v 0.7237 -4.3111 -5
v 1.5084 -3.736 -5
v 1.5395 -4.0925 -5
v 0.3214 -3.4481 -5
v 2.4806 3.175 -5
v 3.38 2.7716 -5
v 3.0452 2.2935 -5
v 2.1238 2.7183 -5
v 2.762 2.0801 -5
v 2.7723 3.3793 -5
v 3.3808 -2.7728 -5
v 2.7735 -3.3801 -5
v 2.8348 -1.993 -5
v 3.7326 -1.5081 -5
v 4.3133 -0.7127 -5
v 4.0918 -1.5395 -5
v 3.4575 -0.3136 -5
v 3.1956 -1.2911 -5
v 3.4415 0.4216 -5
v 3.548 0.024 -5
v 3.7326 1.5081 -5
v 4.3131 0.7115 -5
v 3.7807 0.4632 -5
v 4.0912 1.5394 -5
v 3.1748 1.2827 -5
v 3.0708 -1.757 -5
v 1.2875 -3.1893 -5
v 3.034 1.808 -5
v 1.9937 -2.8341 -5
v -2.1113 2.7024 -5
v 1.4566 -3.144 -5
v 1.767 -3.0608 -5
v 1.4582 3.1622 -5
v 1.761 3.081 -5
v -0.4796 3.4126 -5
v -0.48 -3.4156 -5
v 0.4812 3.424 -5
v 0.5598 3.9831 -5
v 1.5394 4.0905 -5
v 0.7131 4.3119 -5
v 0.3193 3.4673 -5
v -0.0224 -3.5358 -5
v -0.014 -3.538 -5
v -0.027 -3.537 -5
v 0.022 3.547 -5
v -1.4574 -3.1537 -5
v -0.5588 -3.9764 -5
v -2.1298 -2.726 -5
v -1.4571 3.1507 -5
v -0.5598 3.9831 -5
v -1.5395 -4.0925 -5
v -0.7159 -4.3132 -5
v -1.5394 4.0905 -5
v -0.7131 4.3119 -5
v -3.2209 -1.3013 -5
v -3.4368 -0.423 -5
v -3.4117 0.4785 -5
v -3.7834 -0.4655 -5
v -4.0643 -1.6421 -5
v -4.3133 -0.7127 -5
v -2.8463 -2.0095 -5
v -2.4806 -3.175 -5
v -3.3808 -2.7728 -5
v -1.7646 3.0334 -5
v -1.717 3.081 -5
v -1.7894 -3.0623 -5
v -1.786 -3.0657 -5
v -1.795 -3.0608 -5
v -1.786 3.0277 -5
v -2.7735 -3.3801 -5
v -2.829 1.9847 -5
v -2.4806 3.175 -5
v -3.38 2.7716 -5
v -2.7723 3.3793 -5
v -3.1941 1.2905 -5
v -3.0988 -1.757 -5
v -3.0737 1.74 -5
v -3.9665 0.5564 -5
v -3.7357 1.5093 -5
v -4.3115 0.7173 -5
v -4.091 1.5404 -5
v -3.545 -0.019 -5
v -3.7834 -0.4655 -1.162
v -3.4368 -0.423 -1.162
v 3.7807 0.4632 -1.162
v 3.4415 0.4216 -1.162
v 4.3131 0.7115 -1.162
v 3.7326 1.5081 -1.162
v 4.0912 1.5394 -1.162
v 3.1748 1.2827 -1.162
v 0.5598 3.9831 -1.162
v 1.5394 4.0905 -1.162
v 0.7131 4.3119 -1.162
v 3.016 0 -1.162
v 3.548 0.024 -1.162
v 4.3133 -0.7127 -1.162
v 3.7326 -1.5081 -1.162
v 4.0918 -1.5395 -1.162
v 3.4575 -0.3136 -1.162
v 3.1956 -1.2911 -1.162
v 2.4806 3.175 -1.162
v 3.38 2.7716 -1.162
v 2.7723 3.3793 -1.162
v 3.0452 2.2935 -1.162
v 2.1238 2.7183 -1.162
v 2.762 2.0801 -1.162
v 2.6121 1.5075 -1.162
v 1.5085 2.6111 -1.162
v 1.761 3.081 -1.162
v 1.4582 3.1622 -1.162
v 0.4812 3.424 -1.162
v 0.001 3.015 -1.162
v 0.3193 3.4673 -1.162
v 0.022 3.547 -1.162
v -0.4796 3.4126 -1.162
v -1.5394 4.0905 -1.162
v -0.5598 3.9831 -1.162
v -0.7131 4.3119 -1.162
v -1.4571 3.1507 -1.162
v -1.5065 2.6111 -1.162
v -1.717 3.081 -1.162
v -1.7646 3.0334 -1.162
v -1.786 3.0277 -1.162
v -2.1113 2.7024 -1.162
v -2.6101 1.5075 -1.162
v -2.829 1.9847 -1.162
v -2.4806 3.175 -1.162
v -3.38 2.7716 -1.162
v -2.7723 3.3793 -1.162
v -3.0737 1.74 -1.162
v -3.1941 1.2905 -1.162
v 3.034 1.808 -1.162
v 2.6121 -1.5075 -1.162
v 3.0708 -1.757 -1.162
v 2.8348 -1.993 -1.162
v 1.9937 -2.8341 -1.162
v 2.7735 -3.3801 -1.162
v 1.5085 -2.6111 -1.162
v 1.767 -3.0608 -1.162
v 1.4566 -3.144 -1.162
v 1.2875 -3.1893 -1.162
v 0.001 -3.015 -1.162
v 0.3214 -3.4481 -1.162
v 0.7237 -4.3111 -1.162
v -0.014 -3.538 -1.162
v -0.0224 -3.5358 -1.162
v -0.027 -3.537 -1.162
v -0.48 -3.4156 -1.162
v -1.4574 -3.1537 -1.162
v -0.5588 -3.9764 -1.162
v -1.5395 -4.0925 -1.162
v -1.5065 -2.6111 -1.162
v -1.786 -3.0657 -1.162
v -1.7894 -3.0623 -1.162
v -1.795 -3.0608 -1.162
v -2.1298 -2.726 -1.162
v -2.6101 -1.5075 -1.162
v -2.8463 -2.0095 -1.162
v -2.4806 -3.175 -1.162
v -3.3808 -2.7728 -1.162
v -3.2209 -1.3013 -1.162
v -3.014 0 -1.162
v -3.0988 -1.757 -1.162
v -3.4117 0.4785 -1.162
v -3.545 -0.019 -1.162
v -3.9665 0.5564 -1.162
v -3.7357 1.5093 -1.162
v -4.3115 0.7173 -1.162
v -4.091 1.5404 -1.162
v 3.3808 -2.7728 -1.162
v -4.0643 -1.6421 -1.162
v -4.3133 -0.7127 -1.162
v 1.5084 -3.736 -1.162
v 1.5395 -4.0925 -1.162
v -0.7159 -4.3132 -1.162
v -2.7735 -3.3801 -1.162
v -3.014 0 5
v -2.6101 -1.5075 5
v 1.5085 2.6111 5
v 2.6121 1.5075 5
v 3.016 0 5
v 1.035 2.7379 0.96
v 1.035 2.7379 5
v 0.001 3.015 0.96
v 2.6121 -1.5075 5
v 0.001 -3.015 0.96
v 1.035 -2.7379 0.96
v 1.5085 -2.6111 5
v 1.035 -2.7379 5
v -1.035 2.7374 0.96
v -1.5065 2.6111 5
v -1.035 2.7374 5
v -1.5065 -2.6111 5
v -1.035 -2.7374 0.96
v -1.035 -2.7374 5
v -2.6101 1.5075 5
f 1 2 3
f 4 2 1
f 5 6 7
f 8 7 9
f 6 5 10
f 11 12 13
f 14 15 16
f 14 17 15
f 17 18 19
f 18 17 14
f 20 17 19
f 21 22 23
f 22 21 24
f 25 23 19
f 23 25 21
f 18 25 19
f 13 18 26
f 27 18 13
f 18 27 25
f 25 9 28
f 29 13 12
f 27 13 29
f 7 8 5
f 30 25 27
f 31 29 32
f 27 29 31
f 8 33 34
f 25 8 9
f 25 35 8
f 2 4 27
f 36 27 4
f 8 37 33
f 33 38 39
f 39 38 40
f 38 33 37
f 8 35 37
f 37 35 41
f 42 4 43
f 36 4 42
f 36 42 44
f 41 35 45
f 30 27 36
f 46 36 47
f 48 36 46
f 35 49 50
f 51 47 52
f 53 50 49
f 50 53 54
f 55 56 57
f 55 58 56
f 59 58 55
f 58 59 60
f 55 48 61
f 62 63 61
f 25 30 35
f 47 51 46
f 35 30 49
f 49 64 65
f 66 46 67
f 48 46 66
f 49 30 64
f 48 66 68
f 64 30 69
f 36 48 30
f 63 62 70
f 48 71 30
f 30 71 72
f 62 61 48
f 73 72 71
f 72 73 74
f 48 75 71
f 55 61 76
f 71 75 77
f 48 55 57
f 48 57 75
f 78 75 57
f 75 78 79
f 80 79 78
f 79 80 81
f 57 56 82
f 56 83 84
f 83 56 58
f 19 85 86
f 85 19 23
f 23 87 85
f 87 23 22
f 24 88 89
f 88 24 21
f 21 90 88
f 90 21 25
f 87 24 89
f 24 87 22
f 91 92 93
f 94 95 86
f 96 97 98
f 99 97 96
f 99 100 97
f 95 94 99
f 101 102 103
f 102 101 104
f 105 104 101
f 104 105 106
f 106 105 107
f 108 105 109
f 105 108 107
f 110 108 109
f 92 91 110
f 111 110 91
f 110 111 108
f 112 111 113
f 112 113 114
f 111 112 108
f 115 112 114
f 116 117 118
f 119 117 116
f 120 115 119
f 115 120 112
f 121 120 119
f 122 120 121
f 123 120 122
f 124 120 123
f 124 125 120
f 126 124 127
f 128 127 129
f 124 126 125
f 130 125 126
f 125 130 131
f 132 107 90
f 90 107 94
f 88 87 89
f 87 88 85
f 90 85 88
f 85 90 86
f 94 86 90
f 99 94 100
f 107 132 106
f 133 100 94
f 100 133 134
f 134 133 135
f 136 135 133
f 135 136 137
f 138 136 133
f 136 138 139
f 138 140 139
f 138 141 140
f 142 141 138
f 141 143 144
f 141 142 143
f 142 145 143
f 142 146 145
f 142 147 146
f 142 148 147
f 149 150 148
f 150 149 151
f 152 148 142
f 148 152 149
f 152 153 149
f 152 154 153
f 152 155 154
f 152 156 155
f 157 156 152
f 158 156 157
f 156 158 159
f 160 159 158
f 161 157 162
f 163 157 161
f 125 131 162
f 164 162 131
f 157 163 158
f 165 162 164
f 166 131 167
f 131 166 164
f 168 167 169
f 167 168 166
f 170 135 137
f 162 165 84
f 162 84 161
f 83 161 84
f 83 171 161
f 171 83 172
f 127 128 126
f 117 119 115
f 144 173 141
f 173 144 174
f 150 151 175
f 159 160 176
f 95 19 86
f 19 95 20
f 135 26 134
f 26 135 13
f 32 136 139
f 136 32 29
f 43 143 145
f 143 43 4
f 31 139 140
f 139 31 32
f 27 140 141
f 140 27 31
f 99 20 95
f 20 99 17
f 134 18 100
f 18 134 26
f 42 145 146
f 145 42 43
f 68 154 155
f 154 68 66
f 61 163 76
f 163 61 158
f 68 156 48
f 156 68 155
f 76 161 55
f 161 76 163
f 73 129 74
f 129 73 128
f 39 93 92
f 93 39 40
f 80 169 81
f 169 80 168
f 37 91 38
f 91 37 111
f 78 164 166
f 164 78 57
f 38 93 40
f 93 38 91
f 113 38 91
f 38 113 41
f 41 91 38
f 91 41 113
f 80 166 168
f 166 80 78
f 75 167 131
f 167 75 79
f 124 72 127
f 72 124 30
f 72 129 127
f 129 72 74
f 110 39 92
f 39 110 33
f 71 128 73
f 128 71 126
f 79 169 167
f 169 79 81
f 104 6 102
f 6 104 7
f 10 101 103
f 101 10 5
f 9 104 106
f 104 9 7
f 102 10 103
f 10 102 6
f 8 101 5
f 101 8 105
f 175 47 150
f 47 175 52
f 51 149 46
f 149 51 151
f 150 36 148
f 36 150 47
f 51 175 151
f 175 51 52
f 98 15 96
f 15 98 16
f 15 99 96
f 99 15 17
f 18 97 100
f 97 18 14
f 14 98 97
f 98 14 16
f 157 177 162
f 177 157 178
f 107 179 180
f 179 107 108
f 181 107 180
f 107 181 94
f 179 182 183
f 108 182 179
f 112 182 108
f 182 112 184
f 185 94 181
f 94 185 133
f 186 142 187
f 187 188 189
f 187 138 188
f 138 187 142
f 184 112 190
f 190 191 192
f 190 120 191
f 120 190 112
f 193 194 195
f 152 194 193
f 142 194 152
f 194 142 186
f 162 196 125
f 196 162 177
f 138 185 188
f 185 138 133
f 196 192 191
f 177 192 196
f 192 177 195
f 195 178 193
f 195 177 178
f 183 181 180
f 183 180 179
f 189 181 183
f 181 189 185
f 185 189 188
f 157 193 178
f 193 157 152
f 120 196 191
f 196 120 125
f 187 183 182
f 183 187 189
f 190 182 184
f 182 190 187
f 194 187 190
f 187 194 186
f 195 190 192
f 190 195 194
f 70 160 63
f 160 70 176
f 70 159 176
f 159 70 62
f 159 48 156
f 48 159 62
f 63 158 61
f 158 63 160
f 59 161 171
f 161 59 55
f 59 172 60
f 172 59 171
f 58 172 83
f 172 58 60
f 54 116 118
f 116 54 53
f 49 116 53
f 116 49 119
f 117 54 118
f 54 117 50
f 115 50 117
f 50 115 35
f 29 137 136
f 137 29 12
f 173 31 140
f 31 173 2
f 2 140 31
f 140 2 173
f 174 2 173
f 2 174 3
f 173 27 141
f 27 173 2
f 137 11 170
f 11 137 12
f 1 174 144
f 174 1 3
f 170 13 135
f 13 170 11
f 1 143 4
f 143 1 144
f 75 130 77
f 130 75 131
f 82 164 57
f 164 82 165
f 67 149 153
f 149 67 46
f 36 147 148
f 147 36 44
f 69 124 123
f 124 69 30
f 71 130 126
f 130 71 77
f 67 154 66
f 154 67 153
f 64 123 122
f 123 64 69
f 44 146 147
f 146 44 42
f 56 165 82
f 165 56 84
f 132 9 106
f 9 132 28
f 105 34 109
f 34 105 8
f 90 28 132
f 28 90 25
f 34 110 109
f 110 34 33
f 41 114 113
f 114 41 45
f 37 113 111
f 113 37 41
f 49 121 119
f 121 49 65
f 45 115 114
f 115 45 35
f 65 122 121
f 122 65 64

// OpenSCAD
intersection() {
translate([-5.326, -5.326, -6]) cube(size = [10.652, 10.652, 12], center = false);
union() {
intersection() {
union() {
difference() {
translate([0, 0, 0]) sphere(r = 54.3, $fn = 12);
rotate([-180, 0, 7])
translate([-18.1, -18.1, -18.1]) cube(size = [36.2, 18.101, 23.1], center = false);
}
intersection() {
rotate([-180, 0, 25])
translate([-18.1, -18.1, -18.1]) cube(size = [36.2, 19.278, 23.1], center = false);
rotate([-180, 0, 5])
translate([-18.1, -1.177, -18.1]) cube(size = [36.2, 19.278, 36.2], center = false);
}
}
union() {
intersection() {
rotate([-180, 0, 22])
translate([-18.1, 0, -18.1]) cube(size = [36.2, 18.1, 36.2], center = false);
translate([0, -0.001, -5])
cylinder(h = 3.838, r1 = 4.504, r2 = 4.504, center = false, $fn = 12);
}
rotate([-180, 0, 7])
translate([-18.1, 0.001, 1.162]) cube(size = [36.2, 18.099, 3.838], center = false);
}
union() {
difference() {
translate([0, -0.001, -18.1])
cylinder(h = 13.1, r1 = 4.504, r2 = 4.504, center = false, $fn = 12);
translate([0, 0, 0]) sphere(r = 54.3, $fn = 12);
}
intersection() {
translate([-0.014, 0.024, -5])
cylinder(h = 3.838, r1 = 3.562, r2 = 3.562, center = false, $fn = 12);
translate([0, -0.001, -18.1])
cylinder(h = 36.2, r1 = 4.504, r2 = 4.504, center = false, $fn = 12);
}
difference() {
translate([0, -0.001, -18.1])
cylinder(h = 16.938, r1 = 4.504, r2 = 4.504, center = false, $fn = 12);
rotate([-180, 0, 7])
translate([-18.1, 0.001, -18.1]) cube(size = [36.2, 18.099, 36.2], center = false);
}
}
}
intersection() {
difference() {
difference() {
translate([0, -0.001, -5])
cylinder(h = 3.838, r1 = 4.504, r2 = 4.504, center = false, $fn = 12);
translate([5.775, 1.548, -18.1])
cylinder(h = 16.938, r1 = 4.744, r2 = 4.744, center = false, $fn = 12);
}
difference() {
rotate([0, 0, -8])
translate([-18.1, -0.001, -5]) cube(size = [18.1, 18.101, 3.838], center = false);
rotate([0, 0, -25])
translate([-18.1, -1.172, -5]) cube(size = [16.924, 19.272, 3.838], center = false);
}
}
difference() {
union() {
difference() {
translate([-9.487, -0.001, -5])
cylinder(h = 3.838, r1 = 8.765, r2 = 8.765, center = false, $fn = 12);
translate([-8.309, -4.804, -5])
cylinder(h = 3.838, r1 = 8.869, r2 = 8.869, center = false, $fn = 12);
}
rotate([0, 0, -22])
translate([-18.1, -18.1, -18.1]) cube(size = [36.2, 18.1, 16.938], center = false);
rotate([0, 0, -25])
translate([-1.176, -1.172, -18.1]) cube(size = [19.276, 19.272, 16.938], center = false);
}
union() {
intersection() {
rotate([-180, 0, 38])
translate([0, -18.1, -18.1]) cube(size = [18.1, 36.2, 23.1], center = false);
translate([-9.487, -0.001, -5])
cylinder(h = 23.1, r1 = 8.765, r2 = 8.765, center = false, $fn = 12);
}
intersection() {
rotate([0, 0, -35])
translate([-18.1, 1.178, -5]) cube(size = [36.2, 16.922, 23.1], center = false);
rotate([-180, 0, 5])
translate([-18.1, -18.1, 1.162]) cube(size = [16.923, 36.2, 3.838], center = false);
}
}
}
union() {
intersection() {
rotate([0, 0, -5])
translate([-18.1, -18.1, -18.1]) cube(size = [19.277, 36.2, 16.938], center = false);
rotate([-180, 0, 35])
translate([-1.179, -18.1, 1.162]) cube(size = [19.279, 36.2, 3.838], center = false);
}
intersection() {
rotate([0, 0, -8])
translate([-18.1, -0.001, -18.1]) cube(size = [18.1, 18.101, 36.2], center = false);
rotate([0, 0, -5])
translate([-18.1, -18.1, -5]) cube(size = [19.277, 19.278, 23.1], center = false);
}
}
}
translate([-0.027, -0.019, -5])
cylinder(h = 3.838, r1 = 3.518, r2 = 3.518, center = false, $fn = 12);
intersection() {
rotate([0, 0, -38])
translate([0, -18.1, -5]) cube(size = [18.1, 36.2, 3.838], center = false);
difference() {
translate([0, -0.001, -5])
cylinder(h = 3.838, r1 = 4.504, r2 = 4.504, center = false, $fn = 12);
union() {
rotate([0, 0, -35])
translate([1.179, -18.1, -18.1]) cube(size = [16.921, 36.2, 36.2], center = false);
rotate([-180, 0, 35])
translate([-18.1, -18.1, -18.1]) cube(size = [36.2, 16.922, 36.2], center = false);
rotate([-180, 0, 37])
translate([-18.1, 0.001, 1.162]) cube(size = [36.2, 18.099, 3.838], center = false);
}
}
}
intersection() {
difference() {
difference() {
rotate([0, 0, -25])
translate([-18.1, -18.1, -5]) cube(size = [19.274, 19.277, 3.838], center = false);
rotate([0, 0, -5])
translate([-18.1, -18.1, -18.1]) cube(size = [16.923, 36.2, 36.2], center = false);
}
union() {
translate([-9.487, -0.001, -18.1])
cylinder(h = 16.938, r1 = 8.765, r2 = 8.765, center = false, $fn = 12);
rotate([0, 0, -8])
translate([0, -18.1, -5]) cube(size = [18.1, 36.2, 23.1], center = false);
}
}
translate([0, -0.001, -5])
cylinder(h = 23.1, r1 = 4.504, r2 = 4.504, center = false, $fn = 12);
}
intersection() {
rotate([0, 0, -22])
translate([-18.1, 0, -18.1]) cube(size = [36.2, 18.1, 36.2], center = false);
difference() {
difference() {
translate([0, -0.001, -5])
cylinder(h = 3.838, r1 = 4.504, r2 = 4.504, center = false, $fn = 12);
rotate([0, 0, -25])
translate([-18.1, 1.177, -18.1]) cube(size = [36.2, 16.923, 36.2], center = false);
}
difference() {
rotate([0, 0, -35])
translate([-18.1, -1.178, -5]) cube(size = [36.2, 19.278, 3.838], center = false);
rotate([-180, 0, 5])
translate([1.177, -18.1, 1.162]) cube(size = [16.923, 36.2, 16.938], center = false);
}
}
rotate([0, 0, -5])
translate([-18.1, -1.177, -5]) cube(size = [36.2, 19.278, 23.1], center = false);
}
difference() {
translate([0.001, 0, -1.162])
cylinder(h = 6.162, r1 = 3.015, r2 = 3.015, center = false, $fn = 12);
translate([-1.035, -18.1, 0.96]) cube(size = [2.07, 36.2, 17.14], center = false);
}
difference() {
translate([0, -0.001, -5])
cylinder(h = 3.838, r1 = 4.504, r2 = 4.504, center = false, $fn = 12);
difference() {
union() {
rotate([-180, 0, 5])
translate([-18.1, -18.1, -18.1]) cube(size = [36.2, 19.278, 23.1], center = false);
intersection() {
translate([0, -0.001, -18.1])
cylinder(h = 36.2, r1 = 4.504, r2 = 4.504, center = false, $fn = 12);
rotate([-180, 0, 35])
translate([-18.1, 1.178, -18.1]) cube(size = [36.2, 16.922, 36.2], center = false);
}
rotate([0, 0, -38])
translate([0, -18.1, -5]) cube(size = [18.1, 36.2, 23.1], center = false);
rotate([0, 0, -35])
translate([-18.1, -18.1, -18.1]) cube(size = [16.921, 36.2, 36.2], center = false);
}
intersection() {
rotate([-180, 0, 22])
translate([-18.1, -18.1, 1.162]) cube(size = [36.2, 18.1, 3.838], center = false);
rotate([-180, 0, 7])
translate([-18.1, 0.001, -18.1]) cube(size = [36.2, 18.099, 36.2], center = false);
rotate([-180, 0, 7])
translate([-18.1, 0.001, -18.1]) cube(size = [36.2, 18.099, 23.1], center = false);
translate([0, -0.001, -18.1])
cylinder(h = 16.938, r1 = 4.504, r2 = 4.504, center = false, $fn = 12);
rotate([-180, 0, 25])
translate([-18.1, -1.177, -18.1]) cube(size = [36.2, 19.278, 36.2], center = false);
}
}
}
difference() {
intersection() {
difference() {
translate([0, -0.001, -5])
cylinder(h = 3.838, r1 = 4.504, r2 = 4.504, center = false, $fn = 12);
rotate([0, 0, -8])
translate([-18.1, -18.1, -18.1]) cube(size = [36.2, 18.099, 36.2], center = false);
}
rotate([-180, 0, 25])
translate([-18.1, -18.1, 1.162]) cube(size = [19.276, 36.2, 3.838], center = false);
difference() {
rotate([-180, 0, 5])
translate([-1.177, -18.1, -18.1]) cube(size = [19.277, 36.2, 36.2], center = false);
translate([-9.487, -0.001, -5])
cylinder(h = 23.1, r1 = 8.765, r2 = 8.765, center = false, $fn = 12);
}
}
rotate([-180, 0, 8])
translate([0, -18.1, -18.1]) cube(size = [18.1, 36.2, 23.1], center = false);
}
translate([0.022, 0.069, -5])
cylinder(h = 3.838, r1 = 3.478, r2 = 3.478, center = false, $fn = 12);
difference() {
intersection() {
union() {
translate([-0.014, 0.024, -18.1])
cylinder(h = 16.938, r1 = 3.562, r2 = 3.562, center = false, $fn = 12);
rotate([-180, 0, 5])
translate([-18.1, -18.1, -18.1]) cube(size = [19.277, 36.2, 23.1], center = false);
difference() {
rotate([0, 0, -35])
translate([-18.1, -1.178, -18.1]) cube(size = [36.2, 19.278, 36.2], center = false);
translate([5.775, 1.548, -18.1])
cylinder(h = 16.938, r1 = 4.744, r2 = 4.744, center = false, $fn = 12);
}
}
union() {
rotate([-180, 0, 5])
translate([1.177, -18.1, 1.162]) cube(size = [16.923, 36.2, 3.838], center = false);
rotate([-180, 0, 22])
translate([-18.1, -18.1, 1.162]) cube(size = [18.099, 36.2, 3.838], center = false);
}
difference() {
translate([0, -0.001, -18.1])
cylinder(h = 36.2, r1 = 4.504, r2 = 4.504, center = false, $fn = 12);
translate([-9.487, -0.001, -18.1])
cylinder(h = 36.2, r1 = 8.765, r2 = 8.765, center = false, $fn = 12);
}
}
union() {
rotate([0, 0, -22])
translate([-18.1, 0, -18.1]) cube(size = [36.2, 18.1, 36.2], center = false);
difference() {
rotate([-180, 0, 35])
translate([1.179, -18.1, 1.162]) cube(size = [16.921, 36.2, 16.938], center = false);
translate([-0.014, 0.024, -5])
cylinder(h = 3.838, r1 = 3.562, r2 = 3.562, center = false, $fn = 12);
}
rotate([-180, 0, 25])
translate([-18.1, -18.1, -18.1]) cube(size = [16.934, 36.2, 36.2], center = false);
translate([-8.309, -4.804, -18.1])
cylinder(h = 16.938, r1 = 8.869, r2 = 8.869, center = false, $fn = 12);
}
}
}
}
